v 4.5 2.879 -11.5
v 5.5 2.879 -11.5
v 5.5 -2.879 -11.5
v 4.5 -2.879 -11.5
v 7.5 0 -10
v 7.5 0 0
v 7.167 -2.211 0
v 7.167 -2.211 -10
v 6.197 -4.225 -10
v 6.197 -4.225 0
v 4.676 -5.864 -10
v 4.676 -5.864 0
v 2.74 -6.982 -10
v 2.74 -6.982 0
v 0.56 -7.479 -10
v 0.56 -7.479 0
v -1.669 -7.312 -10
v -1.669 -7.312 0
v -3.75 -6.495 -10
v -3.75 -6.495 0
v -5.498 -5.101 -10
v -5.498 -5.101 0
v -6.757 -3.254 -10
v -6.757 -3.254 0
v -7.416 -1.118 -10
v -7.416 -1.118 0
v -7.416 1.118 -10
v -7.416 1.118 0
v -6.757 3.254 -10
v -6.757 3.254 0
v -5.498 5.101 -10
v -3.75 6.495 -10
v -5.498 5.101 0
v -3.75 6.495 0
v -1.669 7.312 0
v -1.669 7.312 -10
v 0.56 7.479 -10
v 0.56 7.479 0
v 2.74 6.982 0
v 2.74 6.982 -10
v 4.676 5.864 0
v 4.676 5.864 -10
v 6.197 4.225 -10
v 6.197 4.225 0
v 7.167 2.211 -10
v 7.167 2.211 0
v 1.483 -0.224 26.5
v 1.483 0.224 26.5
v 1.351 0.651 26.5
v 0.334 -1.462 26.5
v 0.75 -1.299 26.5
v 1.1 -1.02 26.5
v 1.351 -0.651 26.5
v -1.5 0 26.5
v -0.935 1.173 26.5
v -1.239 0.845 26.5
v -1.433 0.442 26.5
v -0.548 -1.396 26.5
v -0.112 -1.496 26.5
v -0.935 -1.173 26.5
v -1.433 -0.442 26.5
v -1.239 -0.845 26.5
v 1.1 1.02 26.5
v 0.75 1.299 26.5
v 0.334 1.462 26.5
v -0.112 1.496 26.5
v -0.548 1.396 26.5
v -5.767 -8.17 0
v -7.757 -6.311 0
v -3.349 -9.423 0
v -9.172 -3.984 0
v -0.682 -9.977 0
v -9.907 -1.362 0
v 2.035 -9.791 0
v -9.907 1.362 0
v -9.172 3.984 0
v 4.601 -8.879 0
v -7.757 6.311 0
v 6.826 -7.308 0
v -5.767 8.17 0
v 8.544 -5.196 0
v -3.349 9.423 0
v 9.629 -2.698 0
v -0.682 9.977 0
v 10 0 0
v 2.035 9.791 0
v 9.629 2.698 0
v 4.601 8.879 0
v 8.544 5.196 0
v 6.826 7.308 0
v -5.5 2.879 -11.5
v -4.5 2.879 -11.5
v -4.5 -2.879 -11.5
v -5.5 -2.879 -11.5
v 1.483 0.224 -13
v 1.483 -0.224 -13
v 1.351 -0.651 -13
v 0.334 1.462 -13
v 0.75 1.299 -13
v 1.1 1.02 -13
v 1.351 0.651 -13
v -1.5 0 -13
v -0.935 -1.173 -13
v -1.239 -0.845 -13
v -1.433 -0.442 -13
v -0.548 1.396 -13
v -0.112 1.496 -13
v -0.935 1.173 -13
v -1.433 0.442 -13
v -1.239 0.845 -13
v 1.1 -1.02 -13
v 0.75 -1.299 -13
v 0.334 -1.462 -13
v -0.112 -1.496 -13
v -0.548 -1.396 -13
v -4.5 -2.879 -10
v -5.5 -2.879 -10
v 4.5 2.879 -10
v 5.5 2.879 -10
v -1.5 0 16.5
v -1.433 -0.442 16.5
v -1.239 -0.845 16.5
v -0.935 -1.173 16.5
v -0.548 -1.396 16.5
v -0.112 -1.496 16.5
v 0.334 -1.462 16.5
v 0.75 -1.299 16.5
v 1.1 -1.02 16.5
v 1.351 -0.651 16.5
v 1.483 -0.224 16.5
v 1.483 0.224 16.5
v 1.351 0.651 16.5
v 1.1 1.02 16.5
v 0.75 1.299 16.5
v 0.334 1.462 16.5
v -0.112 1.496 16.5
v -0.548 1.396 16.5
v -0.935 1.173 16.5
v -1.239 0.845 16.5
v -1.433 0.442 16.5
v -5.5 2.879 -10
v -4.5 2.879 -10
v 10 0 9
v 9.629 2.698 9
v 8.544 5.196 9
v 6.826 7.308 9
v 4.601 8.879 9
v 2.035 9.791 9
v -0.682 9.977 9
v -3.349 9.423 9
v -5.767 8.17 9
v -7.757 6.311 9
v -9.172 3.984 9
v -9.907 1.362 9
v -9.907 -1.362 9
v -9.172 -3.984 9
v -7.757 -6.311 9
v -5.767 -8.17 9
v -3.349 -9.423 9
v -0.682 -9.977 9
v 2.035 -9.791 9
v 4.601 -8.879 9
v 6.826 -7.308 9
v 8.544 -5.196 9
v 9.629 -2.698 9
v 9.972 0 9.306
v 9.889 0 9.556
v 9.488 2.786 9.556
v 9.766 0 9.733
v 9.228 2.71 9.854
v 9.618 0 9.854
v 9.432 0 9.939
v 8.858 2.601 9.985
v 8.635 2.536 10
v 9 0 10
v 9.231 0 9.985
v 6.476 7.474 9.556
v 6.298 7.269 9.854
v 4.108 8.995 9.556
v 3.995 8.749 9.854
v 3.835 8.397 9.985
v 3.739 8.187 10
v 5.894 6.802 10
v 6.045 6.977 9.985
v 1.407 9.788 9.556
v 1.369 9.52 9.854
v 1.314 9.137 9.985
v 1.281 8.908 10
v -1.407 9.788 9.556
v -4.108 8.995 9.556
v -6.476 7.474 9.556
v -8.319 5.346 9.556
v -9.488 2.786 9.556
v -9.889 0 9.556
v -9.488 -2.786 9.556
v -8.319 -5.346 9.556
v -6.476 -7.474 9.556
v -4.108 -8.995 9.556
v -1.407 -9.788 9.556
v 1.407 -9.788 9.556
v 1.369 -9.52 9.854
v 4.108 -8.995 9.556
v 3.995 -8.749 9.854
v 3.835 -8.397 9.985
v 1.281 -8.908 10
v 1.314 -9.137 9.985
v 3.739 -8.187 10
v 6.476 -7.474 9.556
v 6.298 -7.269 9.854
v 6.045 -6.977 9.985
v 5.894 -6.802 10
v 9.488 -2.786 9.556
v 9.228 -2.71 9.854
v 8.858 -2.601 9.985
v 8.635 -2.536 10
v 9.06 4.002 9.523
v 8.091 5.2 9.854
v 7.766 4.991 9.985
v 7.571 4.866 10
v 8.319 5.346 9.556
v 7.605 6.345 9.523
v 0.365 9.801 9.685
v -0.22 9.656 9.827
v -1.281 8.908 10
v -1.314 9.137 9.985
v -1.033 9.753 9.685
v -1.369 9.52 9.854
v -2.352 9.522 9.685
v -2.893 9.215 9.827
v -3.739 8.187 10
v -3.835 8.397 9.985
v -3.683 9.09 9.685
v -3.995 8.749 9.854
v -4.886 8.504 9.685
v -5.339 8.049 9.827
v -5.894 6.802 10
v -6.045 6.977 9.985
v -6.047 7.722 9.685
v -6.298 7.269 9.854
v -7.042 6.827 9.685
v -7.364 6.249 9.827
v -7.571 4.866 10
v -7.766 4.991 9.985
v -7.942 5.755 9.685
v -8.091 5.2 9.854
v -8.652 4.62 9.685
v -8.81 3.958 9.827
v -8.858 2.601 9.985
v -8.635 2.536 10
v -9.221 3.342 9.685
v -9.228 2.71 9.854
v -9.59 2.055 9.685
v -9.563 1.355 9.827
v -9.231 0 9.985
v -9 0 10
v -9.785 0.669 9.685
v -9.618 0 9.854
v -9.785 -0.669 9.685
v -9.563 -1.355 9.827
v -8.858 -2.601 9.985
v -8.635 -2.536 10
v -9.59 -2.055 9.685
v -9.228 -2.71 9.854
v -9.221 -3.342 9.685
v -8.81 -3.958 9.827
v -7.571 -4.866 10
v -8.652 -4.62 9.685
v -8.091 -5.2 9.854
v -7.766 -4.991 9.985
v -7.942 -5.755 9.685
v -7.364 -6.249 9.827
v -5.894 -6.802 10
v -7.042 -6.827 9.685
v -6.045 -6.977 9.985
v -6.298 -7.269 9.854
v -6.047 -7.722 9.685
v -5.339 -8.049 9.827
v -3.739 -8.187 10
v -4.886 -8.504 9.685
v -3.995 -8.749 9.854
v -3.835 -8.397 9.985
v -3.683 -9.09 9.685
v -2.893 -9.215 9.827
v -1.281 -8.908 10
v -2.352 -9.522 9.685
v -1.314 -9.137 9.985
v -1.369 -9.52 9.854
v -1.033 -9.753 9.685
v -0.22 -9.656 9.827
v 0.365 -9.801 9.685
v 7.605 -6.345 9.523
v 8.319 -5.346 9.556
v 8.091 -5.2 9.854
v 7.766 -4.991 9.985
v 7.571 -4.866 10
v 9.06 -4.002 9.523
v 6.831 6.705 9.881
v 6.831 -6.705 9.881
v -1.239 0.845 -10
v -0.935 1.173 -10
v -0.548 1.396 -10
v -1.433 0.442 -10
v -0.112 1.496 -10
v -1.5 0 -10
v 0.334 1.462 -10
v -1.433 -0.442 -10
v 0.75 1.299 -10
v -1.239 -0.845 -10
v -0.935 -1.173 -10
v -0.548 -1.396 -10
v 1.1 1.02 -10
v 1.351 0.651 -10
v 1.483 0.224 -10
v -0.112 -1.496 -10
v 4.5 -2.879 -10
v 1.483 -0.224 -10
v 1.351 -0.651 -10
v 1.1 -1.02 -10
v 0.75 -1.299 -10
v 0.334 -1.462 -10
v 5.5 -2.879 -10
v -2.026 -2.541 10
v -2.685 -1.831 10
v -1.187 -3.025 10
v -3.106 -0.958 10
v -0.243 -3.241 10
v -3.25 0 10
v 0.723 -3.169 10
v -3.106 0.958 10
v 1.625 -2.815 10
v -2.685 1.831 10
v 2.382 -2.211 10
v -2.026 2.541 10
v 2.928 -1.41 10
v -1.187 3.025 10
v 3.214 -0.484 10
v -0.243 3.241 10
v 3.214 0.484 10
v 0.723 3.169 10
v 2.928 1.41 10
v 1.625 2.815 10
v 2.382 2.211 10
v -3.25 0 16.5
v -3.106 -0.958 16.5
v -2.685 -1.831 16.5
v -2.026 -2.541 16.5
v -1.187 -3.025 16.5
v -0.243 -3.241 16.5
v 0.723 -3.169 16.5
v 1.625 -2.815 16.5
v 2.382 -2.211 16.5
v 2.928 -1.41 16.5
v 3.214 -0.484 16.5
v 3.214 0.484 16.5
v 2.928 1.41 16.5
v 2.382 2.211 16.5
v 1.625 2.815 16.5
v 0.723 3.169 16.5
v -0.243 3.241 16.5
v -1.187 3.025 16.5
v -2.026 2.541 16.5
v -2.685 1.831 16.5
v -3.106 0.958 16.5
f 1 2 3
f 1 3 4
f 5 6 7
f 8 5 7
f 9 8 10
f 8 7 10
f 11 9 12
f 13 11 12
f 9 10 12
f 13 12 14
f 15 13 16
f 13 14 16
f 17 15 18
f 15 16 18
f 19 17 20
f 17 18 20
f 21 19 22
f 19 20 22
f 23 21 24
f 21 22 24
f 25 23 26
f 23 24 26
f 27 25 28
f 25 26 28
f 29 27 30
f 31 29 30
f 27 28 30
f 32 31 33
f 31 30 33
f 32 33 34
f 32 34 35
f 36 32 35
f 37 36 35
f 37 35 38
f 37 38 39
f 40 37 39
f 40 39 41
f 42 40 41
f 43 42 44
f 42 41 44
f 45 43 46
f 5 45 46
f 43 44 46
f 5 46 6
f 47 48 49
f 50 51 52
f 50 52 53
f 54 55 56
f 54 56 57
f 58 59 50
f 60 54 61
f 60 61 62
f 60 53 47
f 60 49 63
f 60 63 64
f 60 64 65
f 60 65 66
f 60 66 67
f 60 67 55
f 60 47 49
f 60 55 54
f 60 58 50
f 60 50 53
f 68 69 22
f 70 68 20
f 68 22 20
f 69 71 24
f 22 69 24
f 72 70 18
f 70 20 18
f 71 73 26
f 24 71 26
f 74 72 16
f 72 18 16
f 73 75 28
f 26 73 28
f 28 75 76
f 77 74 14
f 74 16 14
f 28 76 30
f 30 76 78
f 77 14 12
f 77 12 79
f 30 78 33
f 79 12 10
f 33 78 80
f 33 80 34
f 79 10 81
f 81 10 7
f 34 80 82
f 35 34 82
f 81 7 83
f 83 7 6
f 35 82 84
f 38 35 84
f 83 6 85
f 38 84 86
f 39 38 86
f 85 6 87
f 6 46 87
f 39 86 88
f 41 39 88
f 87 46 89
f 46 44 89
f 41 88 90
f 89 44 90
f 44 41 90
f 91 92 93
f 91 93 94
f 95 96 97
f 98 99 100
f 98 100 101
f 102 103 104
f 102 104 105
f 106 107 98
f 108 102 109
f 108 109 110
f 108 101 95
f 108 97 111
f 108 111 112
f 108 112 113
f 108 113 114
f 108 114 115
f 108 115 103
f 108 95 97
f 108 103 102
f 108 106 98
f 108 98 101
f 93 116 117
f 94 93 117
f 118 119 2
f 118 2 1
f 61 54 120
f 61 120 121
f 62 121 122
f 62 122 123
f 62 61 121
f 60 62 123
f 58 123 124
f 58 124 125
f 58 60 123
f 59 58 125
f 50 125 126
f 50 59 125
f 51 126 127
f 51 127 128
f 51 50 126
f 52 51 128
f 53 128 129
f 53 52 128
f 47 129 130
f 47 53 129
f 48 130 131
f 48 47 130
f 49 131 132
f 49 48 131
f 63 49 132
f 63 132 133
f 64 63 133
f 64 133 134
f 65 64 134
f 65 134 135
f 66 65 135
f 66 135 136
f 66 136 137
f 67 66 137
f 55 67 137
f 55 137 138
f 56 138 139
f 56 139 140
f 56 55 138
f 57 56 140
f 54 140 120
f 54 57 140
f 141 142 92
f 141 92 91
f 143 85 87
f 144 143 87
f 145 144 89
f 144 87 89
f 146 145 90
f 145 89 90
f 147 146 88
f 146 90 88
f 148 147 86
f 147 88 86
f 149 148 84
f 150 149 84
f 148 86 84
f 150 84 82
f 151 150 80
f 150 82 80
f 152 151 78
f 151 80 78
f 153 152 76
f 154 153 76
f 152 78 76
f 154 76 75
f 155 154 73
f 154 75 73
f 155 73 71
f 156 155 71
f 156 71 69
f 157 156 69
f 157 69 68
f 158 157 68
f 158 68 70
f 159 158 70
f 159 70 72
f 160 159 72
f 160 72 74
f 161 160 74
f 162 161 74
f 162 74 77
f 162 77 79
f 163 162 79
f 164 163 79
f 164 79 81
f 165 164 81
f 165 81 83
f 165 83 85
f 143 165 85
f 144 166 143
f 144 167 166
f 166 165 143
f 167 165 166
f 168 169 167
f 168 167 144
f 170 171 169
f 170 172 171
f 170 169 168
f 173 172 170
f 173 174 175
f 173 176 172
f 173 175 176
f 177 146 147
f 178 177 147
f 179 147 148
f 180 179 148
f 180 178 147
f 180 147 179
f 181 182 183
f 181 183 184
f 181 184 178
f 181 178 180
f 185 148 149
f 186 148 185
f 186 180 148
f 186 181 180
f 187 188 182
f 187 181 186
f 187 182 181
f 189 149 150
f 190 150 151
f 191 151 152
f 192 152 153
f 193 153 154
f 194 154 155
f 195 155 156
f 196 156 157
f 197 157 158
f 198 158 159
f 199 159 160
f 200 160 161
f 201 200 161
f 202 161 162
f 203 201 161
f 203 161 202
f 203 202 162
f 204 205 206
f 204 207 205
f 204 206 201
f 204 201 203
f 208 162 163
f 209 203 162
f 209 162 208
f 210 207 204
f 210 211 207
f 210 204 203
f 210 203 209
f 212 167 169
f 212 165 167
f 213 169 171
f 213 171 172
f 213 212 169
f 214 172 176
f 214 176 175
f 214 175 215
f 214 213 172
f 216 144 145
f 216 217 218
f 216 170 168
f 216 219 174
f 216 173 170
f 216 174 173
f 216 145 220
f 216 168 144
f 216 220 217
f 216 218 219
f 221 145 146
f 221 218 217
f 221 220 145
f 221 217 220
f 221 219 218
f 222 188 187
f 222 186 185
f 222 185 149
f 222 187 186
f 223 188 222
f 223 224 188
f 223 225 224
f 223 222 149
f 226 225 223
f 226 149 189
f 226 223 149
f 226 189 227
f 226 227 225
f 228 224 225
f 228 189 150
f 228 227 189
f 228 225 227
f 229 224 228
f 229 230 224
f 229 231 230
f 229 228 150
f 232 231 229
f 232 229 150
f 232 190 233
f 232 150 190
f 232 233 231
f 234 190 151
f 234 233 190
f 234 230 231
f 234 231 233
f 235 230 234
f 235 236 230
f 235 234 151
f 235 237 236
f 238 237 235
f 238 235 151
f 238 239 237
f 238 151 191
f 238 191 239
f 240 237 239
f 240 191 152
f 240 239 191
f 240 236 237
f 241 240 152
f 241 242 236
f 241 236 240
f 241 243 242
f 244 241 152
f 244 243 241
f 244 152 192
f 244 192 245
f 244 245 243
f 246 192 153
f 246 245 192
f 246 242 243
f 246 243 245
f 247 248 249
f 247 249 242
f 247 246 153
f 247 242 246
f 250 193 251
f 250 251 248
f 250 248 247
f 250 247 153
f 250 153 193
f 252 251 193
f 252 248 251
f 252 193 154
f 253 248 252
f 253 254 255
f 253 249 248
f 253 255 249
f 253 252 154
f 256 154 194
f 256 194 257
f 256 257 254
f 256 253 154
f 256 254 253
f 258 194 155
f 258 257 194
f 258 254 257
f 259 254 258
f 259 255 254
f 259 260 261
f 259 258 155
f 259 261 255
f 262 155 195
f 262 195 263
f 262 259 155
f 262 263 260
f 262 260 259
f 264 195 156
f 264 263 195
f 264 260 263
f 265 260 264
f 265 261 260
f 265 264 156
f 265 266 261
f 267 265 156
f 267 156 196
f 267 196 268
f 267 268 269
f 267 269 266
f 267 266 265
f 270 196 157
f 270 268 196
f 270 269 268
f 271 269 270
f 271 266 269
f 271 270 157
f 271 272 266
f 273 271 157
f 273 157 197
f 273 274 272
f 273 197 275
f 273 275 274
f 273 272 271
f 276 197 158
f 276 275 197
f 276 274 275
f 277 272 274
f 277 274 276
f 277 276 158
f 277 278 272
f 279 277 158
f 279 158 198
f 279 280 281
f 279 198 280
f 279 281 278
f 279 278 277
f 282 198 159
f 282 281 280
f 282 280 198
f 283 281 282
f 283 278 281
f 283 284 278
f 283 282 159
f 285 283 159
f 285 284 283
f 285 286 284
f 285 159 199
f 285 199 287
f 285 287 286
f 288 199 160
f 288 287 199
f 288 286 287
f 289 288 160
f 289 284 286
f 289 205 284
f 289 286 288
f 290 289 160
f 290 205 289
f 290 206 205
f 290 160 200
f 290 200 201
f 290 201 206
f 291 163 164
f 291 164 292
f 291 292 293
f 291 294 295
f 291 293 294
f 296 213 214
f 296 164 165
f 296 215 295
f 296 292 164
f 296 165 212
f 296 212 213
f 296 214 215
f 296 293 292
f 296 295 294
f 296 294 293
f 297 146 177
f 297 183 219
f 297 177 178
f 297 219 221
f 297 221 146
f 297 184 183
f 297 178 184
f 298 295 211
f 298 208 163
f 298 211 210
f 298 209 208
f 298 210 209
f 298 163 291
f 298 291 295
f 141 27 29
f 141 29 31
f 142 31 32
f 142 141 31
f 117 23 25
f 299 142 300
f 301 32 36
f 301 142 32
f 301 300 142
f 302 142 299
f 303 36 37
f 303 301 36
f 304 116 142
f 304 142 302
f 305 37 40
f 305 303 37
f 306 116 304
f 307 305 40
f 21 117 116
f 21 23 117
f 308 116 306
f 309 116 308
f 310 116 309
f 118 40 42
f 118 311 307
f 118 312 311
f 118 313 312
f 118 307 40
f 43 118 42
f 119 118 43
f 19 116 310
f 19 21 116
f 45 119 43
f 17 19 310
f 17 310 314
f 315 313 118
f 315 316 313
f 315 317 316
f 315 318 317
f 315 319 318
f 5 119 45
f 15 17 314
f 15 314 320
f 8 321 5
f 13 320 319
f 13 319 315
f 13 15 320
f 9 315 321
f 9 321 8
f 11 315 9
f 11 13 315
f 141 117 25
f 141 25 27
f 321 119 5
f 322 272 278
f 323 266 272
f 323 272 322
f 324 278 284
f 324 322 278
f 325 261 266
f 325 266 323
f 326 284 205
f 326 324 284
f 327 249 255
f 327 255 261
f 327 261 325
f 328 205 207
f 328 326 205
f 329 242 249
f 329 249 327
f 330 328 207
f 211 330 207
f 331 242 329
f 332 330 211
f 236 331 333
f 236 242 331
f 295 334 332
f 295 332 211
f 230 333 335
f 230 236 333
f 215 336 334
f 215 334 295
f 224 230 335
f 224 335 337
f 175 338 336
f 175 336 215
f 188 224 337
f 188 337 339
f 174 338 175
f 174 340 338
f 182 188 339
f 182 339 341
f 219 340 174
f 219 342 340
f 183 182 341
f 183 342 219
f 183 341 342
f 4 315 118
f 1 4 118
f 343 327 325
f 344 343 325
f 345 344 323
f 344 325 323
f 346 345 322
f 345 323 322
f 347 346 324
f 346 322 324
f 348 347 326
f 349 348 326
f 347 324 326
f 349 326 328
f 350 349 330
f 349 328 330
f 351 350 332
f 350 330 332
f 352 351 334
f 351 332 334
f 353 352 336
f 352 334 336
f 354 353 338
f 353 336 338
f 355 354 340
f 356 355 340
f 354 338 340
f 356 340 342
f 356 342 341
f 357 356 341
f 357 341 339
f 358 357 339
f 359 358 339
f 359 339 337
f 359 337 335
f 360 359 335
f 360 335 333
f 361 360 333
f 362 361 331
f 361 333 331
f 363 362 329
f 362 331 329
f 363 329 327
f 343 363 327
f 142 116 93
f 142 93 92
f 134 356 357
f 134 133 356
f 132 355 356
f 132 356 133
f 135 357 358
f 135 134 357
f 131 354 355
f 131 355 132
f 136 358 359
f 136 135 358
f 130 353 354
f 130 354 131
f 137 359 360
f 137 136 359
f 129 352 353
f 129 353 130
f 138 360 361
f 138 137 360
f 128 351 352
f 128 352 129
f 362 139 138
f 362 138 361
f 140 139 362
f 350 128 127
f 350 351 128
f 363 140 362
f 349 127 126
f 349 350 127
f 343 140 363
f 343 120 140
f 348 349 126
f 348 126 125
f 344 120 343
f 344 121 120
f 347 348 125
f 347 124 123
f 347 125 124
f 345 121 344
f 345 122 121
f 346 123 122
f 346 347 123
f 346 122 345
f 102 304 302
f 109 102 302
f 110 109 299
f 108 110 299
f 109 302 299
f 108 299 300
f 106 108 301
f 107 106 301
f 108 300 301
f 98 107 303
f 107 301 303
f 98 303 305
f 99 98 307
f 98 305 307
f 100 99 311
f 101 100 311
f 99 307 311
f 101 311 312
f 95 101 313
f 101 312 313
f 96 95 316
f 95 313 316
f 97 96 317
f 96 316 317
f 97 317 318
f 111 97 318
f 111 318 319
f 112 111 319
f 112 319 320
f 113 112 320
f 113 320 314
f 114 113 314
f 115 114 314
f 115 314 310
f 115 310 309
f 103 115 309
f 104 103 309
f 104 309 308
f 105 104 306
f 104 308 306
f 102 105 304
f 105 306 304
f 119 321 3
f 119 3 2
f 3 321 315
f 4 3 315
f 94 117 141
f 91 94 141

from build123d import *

# Parameters (mm, degrees)
SKETCH1_R           = 10
BOSS_EXTRUDE1_DEPTH = 10
SKETCH2_R           = 7.5
BOSS_EXTRUDE2_DEPTH = 10
SKETCH3_R           = 1.5
BOSS_EXTRUDE5_DEPTH = 3
SKETCH7_W           = 1
SKETCH7_H           = 5.758644492
BOSS_EXTRUDE7_DEPTH = 1.5
SKETCH8_R           = 3.25
BOSS_EXTRUDE8_DEPTH = 6.5
BOSS_EXTRUDE9_START = 10
SKETCH9_R           = 1.5
BOSS_EXTRUDE9_DEPTH = 10
FILLET2_SIZE        = 1


with BuildPart() as part:
    # Sketch1 → Boss-Extrude1 (new body)
    with BuildSketch(Plane.XY):
        Circle(SKETCH1_R)
    extrude(amount=BOSS_EXTRUDE1_DEPTH)

    # Sketch2 → Boss-Extrude2 (add)
    with BuildSketch(Plane(origin=(0, 0, 0), x_dir=(-1, 0, 0), z_dir=(0, 0, -1))):
        with Locations(Location((0, 0, 0), (0, 0, 180))):
            Circle(SKETCH2_R)
    extrude(amount=BOSS_EXTRUDE2_DEPTH)

    # Sketch3 → Boss-Extrude5 (add)
    with BuildSketch(Plane(origin=(0, 0, -10), x_dir=(-1, 0, 0), z_dir=(0, 0, -1))):
        Circle(SKETCH3_R)
    extrude(amount=BOSS_EXTRUDE5_DEPTH)

    # Sketch7 → Boss-Extrude7 (add)
    with BuildSketch(Plane(origin=(0, 0, -10), x_dir=(-1, 0, 0), z_dir=(0, 0, -1))):
        with Locations((-5, 0)):
            Rectangle(SKETCH7_W, SKETCH7_H)
        with Locations((5, 0)):
            Rectangle(SKETCH7_W, SKETCH7_H)
    extrude(amount=BOSS_EXTRUDE7_DEPTH)

    # Sketch8 → Boss-Extrude8 (add)
    with BuildSketch(Plane.XY.offset(10)):
        with Locations(Location((0, 0, 0), (0, 0, 180))):
            Circle(SKETCH8_R)
    extrude(amount=BOSS_EXTRUDE8_DEPTH)

    # Sketch9 → Boss-Extrude9 (add)
    with BuildSketch(Plane.XY.offset(16.5).offset(BOSS_EXTRUDE9_START)):
        with Locations(Location((0, 0, 0), (0, 0, 180))):
            Circle(SKETCH9_R)
    extrude(amount=-BOSS_EXTRUDE9_DEPTH)

    # Fillet2
    # a fillet whose section is not a circle: 1 mm, written as the material it takes off along each edge
    with BuildSketch(Plane(origin=(0, 0, 10), x_dir=(1, 0, 0), z_dir=(0, -1, 0))) as fillet2_piece_1:
        with BuildLine():
            Bezier((10, -FILLET2_SIZE), (10, 0), (10 - FILLET2_SIZE, 0), weights=[1, 1, 1])
            Line((10 - FILLET2_SIZE, 0), (10, 0))
            Line((10, 0), (10, -FILLET2_SIZE))
        make_face()
    revolve(axis=Axis((0, 0, 10), (0, 0, 1)), mode=Mode.SUBTRACT)


solid = part.part
